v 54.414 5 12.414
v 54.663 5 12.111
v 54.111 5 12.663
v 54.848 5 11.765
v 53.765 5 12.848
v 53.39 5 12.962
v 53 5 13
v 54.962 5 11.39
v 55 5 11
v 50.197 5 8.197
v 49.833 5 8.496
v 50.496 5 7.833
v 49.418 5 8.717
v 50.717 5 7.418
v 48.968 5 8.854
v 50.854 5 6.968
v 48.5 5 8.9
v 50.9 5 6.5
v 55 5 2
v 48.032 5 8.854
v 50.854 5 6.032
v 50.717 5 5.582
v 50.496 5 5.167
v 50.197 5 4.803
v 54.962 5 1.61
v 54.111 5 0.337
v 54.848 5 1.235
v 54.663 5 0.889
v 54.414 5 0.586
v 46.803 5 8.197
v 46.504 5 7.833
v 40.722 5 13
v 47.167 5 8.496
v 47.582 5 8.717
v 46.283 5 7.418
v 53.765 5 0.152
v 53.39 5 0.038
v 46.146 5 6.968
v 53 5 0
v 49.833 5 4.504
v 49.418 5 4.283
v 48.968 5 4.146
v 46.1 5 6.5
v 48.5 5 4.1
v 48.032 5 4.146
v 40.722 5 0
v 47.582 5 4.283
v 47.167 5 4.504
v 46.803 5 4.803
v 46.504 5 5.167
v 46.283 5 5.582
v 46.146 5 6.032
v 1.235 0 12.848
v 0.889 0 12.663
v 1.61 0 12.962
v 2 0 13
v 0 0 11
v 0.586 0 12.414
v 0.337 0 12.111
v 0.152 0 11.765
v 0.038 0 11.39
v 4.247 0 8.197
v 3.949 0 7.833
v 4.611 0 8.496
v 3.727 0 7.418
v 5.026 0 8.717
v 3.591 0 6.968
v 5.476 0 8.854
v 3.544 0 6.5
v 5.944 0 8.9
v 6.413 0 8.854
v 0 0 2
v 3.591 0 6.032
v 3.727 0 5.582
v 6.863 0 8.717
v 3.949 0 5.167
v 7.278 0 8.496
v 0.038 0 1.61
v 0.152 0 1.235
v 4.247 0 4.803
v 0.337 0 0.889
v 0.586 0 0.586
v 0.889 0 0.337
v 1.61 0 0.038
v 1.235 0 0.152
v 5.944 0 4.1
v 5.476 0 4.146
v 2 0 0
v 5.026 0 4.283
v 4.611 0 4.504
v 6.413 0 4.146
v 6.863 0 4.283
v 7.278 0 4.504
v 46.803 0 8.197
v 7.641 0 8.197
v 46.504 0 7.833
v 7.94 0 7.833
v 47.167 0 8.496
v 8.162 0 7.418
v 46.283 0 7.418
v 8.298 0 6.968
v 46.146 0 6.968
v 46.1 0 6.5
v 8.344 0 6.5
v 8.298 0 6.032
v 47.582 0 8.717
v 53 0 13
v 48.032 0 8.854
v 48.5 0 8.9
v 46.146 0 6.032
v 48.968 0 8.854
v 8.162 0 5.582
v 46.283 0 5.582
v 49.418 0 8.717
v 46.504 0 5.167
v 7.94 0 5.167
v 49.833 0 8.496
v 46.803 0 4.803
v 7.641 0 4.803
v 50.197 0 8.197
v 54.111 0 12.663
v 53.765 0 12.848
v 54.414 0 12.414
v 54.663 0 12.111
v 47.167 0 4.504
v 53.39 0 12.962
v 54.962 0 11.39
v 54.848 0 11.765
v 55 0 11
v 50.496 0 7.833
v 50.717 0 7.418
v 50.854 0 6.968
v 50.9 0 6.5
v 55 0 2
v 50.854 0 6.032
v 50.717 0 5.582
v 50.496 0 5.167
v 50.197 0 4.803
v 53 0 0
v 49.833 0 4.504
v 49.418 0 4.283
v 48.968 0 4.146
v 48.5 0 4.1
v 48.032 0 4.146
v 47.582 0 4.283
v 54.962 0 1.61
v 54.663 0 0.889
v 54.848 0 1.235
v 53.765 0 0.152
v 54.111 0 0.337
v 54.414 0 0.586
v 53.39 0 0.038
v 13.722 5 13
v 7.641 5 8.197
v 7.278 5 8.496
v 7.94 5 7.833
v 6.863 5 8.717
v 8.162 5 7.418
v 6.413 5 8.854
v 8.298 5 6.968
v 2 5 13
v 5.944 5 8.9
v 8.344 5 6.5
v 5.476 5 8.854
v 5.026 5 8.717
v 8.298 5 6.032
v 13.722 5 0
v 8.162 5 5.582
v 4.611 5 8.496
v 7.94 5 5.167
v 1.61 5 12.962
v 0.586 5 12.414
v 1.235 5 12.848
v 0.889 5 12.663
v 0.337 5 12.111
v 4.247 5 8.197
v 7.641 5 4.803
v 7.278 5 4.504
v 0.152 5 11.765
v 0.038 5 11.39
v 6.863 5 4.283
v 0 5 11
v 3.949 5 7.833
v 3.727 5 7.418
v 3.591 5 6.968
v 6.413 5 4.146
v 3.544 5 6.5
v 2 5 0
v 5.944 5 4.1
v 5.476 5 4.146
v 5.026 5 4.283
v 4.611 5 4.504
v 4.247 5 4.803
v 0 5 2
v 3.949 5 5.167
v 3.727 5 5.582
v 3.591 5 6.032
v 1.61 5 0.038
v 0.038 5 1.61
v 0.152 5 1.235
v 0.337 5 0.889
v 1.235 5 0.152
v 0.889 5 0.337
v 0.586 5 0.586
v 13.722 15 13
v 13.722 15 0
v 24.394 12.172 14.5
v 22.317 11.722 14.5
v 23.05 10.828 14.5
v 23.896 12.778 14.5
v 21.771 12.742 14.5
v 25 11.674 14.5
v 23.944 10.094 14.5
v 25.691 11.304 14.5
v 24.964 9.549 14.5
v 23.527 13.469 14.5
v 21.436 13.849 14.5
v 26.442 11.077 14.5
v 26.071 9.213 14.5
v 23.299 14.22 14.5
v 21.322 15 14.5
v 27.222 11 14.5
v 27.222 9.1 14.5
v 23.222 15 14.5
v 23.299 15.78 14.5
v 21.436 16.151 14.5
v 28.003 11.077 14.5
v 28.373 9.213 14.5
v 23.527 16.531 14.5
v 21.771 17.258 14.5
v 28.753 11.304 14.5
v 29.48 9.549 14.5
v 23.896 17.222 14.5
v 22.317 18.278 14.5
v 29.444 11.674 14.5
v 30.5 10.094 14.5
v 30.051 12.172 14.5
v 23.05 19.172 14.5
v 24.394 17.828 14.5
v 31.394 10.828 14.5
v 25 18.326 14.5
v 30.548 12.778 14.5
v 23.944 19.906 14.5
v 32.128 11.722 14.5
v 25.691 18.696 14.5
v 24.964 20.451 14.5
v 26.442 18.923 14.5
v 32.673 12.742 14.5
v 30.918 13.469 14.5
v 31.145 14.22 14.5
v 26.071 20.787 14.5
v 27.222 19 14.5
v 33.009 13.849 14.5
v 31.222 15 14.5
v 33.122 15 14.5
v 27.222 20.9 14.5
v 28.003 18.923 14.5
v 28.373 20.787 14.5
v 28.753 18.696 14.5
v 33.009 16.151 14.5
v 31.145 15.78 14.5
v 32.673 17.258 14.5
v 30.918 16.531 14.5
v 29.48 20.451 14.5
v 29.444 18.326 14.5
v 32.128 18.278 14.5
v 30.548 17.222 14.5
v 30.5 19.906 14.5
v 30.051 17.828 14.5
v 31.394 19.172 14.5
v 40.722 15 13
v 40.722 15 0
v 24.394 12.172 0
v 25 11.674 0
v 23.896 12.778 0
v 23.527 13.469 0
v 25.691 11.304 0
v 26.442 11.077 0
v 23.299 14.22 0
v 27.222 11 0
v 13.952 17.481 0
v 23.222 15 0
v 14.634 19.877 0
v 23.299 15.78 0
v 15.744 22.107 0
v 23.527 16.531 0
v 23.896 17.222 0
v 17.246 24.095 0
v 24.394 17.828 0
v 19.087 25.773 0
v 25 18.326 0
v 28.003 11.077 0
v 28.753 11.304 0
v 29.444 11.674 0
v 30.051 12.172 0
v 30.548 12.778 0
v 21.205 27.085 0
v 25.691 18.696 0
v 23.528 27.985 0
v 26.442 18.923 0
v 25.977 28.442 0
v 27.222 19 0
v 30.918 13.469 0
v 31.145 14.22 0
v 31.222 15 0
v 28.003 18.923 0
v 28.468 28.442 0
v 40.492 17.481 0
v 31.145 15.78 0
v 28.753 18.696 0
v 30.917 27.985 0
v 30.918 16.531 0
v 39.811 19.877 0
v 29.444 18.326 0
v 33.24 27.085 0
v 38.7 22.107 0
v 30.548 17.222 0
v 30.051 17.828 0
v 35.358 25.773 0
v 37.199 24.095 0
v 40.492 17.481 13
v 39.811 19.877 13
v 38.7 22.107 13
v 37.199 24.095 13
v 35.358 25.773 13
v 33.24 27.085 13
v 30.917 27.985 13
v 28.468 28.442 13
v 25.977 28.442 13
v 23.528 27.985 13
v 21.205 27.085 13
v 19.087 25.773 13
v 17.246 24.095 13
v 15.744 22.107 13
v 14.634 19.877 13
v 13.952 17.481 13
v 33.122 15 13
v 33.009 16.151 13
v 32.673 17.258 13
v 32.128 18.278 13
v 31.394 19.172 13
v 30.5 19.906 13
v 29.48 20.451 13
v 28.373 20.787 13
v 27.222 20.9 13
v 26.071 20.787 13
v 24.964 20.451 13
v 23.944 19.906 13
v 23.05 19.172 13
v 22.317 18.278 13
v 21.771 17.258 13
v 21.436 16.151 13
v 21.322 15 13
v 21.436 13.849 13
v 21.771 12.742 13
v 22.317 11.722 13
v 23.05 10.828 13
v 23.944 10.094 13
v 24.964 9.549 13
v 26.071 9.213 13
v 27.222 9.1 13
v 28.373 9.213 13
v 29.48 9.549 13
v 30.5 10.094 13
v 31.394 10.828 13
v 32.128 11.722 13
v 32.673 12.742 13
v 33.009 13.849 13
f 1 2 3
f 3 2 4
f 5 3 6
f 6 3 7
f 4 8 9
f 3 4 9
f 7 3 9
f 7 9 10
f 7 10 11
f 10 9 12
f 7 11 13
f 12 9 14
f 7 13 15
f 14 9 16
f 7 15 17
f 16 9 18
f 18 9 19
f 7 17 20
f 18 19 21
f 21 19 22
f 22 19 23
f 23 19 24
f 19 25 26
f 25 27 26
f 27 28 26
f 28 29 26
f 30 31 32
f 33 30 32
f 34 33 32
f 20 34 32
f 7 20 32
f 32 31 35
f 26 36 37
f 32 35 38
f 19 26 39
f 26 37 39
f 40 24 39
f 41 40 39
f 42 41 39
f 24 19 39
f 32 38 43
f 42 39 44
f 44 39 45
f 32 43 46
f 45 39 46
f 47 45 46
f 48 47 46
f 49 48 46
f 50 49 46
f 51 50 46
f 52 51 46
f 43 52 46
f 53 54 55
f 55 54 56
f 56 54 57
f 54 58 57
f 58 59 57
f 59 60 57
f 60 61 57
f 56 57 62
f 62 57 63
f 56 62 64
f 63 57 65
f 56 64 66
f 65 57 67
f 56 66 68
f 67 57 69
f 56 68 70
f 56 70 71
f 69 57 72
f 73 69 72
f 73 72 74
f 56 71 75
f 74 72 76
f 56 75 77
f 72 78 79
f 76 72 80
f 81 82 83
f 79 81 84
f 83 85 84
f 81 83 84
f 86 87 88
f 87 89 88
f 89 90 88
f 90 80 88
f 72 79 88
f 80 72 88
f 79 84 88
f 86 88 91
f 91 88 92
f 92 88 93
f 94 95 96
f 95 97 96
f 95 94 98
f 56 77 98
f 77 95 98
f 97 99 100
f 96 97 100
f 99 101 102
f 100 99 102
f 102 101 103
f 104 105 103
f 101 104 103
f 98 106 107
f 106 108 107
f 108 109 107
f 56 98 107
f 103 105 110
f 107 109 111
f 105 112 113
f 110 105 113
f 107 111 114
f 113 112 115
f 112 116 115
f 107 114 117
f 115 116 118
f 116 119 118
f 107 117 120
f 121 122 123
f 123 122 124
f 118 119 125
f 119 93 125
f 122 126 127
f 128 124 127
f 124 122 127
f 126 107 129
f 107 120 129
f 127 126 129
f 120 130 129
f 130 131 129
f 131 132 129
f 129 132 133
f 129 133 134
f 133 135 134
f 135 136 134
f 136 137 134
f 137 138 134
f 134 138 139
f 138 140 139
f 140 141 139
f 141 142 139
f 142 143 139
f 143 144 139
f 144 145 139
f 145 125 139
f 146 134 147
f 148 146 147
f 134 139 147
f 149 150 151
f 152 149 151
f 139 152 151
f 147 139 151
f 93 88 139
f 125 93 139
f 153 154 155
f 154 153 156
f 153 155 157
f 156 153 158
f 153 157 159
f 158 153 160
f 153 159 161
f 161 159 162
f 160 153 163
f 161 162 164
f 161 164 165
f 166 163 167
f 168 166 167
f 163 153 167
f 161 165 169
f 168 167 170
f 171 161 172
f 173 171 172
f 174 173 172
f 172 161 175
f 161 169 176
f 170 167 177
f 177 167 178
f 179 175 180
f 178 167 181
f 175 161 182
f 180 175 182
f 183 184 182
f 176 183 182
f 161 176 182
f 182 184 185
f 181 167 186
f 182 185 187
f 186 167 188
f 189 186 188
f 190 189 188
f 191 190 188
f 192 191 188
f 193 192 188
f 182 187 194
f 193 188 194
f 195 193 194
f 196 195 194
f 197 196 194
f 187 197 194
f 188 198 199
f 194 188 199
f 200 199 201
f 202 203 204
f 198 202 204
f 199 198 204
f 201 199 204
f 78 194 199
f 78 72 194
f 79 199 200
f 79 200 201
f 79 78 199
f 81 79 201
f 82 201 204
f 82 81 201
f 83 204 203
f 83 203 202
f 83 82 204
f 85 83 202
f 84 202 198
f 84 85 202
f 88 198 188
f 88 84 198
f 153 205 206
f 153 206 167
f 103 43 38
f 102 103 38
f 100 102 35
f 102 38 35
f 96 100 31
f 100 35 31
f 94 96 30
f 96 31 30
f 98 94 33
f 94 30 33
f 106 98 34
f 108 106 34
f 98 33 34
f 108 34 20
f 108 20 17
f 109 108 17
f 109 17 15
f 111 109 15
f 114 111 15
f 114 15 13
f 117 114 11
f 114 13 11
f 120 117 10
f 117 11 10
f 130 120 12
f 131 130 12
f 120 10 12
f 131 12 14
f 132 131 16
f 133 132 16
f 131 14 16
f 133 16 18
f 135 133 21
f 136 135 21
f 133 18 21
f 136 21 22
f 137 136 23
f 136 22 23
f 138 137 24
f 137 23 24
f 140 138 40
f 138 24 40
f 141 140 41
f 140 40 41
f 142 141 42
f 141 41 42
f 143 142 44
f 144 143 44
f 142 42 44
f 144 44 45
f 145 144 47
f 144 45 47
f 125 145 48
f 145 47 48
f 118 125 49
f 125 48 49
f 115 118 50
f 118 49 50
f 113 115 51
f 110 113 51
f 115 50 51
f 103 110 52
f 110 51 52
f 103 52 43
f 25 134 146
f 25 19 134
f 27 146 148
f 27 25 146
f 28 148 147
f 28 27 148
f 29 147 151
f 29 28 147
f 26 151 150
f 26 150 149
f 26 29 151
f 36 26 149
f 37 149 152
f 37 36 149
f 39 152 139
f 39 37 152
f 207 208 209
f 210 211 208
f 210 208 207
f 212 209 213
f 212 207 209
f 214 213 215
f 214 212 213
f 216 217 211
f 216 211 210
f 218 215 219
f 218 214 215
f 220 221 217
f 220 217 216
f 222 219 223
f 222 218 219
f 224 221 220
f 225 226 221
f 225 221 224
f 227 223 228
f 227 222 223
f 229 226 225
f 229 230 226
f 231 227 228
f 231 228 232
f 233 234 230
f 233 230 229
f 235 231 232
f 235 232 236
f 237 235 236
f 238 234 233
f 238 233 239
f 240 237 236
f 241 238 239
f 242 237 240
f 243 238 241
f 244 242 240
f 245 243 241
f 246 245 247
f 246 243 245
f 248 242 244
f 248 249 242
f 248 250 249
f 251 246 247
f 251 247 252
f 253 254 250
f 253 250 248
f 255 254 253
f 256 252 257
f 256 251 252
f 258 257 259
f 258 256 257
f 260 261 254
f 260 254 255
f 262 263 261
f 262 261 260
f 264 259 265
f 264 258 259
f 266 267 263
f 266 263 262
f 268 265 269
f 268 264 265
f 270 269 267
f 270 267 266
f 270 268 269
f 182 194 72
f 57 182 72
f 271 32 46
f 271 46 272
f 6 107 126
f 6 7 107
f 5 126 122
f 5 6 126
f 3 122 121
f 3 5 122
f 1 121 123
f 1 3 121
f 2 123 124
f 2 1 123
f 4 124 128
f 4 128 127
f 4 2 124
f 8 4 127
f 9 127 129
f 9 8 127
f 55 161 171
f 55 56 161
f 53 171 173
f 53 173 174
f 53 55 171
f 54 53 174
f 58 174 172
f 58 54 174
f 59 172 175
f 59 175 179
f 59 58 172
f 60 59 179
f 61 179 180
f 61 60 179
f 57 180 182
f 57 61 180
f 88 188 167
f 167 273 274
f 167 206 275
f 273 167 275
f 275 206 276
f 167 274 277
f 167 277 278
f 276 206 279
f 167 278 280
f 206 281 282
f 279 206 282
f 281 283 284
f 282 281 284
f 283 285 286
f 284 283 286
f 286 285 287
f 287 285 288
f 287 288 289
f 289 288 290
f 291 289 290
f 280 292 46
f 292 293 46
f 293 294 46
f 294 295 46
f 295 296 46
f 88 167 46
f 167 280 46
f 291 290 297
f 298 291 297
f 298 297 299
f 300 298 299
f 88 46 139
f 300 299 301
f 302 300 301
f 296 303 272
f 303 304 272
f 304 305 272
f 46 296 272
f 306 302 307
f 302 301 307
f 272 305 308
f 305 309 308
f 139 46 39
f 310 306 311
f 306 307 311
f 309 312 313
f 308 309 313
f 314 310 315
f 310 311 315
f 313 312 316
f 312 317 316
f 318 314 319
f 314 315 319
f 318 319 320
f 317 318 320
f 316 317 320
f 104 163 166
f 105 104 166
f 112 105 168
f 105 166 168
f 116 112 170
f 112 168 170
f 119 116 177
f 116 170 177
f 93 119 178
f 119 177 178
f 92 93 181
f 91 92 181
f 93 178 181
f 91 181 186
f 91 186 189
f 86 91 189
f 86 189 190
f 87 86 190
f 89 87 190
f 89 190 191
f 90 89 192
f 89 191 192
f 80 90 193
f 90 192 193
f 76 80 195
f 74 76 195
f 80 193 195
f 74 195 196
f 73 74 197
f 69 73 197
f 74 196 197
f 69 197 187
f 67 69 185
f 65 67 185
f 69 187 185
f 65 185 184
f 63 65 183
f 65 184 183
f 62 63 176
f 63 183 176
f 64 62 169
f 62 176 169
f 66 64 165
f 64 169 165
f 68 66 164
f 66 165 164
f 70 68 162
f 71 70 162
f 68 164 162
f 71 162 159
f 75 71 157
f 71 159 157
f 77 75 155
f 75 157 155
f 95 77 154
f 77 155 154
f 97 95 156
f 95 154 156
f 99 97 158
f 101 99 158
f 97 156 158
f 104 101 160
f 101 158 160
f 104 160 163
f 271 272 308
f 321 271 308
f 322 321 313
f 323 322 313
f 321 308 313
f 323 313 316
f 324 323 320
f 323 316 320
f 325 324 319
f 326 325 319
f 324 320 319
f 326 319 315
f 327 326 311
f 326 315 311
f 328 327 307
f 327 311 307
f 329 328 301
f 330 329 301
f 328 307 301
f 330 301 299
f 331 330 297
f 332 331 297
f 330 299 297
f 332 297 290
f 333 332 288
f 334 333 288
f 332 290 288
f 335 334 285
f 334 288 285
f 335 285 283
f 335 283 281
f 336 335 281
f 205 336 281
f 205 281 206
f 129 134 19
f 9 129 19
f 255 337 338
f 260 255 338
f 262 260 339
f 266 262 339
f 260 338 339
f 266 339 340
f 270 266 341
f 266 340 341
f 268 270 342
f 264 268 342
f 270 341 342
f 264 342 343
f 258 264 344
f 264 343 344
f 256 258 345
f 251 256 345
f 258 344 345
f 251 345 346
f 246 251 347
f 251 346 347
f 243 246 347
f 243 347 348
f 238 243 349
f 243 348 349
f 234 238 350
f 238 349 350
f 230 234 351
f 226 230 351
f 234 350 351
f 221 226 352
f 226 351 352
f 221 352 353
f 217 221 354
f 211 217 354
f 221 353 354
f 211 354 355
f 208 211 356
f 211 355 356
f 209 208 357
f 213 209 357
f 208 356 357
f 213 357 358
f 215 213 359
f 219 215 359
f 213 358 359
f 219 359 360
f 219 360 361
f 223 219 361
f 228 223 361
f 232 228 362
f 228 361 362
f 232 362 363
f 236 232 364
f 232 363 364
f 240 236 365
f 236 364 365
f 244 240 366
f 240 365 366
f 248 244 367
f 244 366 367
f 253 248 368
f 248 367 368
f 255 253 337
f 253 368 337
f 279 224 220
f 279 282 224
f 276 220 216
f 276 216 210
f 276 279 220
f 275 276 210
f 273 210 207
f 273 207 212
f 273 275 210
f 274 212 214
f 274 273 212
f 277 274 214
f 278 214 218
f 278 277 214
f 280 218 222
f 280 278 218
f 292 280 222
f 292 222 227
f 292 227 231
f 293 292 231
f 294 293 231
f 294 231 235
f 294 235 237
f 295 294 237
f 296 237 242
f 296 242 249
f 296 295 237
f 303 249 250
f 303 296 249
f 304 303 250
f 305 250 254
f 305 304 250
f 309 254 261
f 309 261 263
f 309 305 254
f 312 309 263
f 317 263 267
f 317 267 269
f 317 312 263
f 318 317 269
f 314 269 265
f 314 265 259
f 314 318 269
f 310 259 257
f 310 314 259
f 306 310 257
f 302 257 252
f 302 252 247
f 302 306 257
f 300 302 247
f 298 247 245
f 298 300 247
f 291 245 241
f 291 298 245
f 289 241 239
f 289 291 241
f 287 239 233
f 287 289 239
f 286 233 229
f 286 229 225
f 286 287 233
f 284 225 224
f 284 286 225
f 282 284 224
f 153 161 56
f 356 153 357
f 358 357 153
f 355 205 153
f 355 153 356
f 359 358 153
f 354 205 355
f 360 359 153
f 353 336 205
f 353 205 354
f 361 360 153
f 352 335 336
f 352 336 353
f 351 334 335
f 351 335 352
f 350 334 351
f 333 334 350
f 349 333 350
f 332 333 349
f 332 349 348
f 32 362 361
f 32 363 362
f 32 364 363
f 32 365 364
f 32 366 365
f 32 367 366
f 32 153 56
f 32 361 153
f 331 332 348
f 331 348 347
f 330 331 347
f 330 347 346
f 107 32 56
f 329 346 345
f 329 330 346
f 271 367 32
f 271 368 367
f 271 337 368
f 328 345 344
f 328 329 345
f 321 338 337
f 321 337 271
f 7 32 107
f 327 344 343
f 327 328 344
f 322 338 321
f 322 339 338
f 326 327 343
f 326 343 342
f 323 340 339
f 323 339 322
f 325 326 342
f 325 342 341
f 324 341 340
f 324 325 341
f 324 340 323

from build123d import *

# Parameters (mm, degrees)
SKETCH2_R           = 4
BOSS_EXTRUDE1_DEPTH = 13
SKETCH3_R           = 5.9
SKETCH3_R_2         = 4
BOSS_EXTRUDE2_DEPTH = 1.5
SKETCH4_R           = 2.4
CUT_EXTRUDE1_DEPTH  = 5
FILLET1_R           = 2
FILLET2_R           = 2


with BuildPart() as part:
    # Sketch2 → Boss-Extrude1 (new body)
    with BuildSketch(Plane.XY):
        with BuildLine():
            Line((0, 0), (55, 0))
            Line((55, 0), (55, 5))
            Line((55, 5), (40.722217225, 5))
            Line((40.722217225, 5), (40.722217225, 15))
            ThreePointArc((40.722217225, 15), (27.222217225, 28.5), (13.722217225, 15))
            Line((13.722217225, 15), (13.722217225, 5))
            Line((13.722217225, 5), (0, 5))
            Line((0, 5), (0, 0))
        make_face()
        with Locations(Location((27.222217225, 15, 0), (0, 0, 180))):
            Circle(SKETCH2_R, mode=Mode.SUBTRACT)
    extrude(amount=BOSS_EXTRUDE1_DEPTH)

    # Sketch3 → Boss-Extrude2 (add)
    with BuildSketch(Plane.XY.offset(13)):
        with Locations((27.222217225, 15)):
            Circle(SKETCH3_R)
        with Locations(Location((27.222217225, 15, 0), (0, 0, 180))):
            Circle(SKETCH3_R_2, mode=Mode.SUBTRACT)
    extrude(amount=BOSS_EXTRUDE2_DEPTH)

    # Sketch4 → Cut-Extrude1 (cut)
    with BuildSketch(Plane(origin=(0, 5, 0), x_dir=(1, 0, 0), z_dir=(0, 1, 0))):
        with Locations(Location((48.5, -6.5, 0), (0, 0, 180))):
            Circle(SKETCH4_R)
        with Locations((5.944434451, -6.5)):
            Circle(SKETCH4_R)
    extrude(amount=-CUT_EXTRUDE1_DEPTH, mode=Mode.SUBTRACT)

    # Fillet1
    fillet1_edges = [part.edges().sort_by_distance(p)[0] for p in [
        (55, 2.5, 13),
    ]]
    fillet(fillet1_edges, radius=FILLET1_R)

    # Fillet2
    fillet2_edges = [part.edges().sort_by_distance(p)[0] for p in [
        (0, 2.5, 0),
        (0, 2.5, 13),
        (55, 2.5, 0),
    ]]
    fillet(fillet2_edges, radius=FILLET2_R)


solid = part.part
